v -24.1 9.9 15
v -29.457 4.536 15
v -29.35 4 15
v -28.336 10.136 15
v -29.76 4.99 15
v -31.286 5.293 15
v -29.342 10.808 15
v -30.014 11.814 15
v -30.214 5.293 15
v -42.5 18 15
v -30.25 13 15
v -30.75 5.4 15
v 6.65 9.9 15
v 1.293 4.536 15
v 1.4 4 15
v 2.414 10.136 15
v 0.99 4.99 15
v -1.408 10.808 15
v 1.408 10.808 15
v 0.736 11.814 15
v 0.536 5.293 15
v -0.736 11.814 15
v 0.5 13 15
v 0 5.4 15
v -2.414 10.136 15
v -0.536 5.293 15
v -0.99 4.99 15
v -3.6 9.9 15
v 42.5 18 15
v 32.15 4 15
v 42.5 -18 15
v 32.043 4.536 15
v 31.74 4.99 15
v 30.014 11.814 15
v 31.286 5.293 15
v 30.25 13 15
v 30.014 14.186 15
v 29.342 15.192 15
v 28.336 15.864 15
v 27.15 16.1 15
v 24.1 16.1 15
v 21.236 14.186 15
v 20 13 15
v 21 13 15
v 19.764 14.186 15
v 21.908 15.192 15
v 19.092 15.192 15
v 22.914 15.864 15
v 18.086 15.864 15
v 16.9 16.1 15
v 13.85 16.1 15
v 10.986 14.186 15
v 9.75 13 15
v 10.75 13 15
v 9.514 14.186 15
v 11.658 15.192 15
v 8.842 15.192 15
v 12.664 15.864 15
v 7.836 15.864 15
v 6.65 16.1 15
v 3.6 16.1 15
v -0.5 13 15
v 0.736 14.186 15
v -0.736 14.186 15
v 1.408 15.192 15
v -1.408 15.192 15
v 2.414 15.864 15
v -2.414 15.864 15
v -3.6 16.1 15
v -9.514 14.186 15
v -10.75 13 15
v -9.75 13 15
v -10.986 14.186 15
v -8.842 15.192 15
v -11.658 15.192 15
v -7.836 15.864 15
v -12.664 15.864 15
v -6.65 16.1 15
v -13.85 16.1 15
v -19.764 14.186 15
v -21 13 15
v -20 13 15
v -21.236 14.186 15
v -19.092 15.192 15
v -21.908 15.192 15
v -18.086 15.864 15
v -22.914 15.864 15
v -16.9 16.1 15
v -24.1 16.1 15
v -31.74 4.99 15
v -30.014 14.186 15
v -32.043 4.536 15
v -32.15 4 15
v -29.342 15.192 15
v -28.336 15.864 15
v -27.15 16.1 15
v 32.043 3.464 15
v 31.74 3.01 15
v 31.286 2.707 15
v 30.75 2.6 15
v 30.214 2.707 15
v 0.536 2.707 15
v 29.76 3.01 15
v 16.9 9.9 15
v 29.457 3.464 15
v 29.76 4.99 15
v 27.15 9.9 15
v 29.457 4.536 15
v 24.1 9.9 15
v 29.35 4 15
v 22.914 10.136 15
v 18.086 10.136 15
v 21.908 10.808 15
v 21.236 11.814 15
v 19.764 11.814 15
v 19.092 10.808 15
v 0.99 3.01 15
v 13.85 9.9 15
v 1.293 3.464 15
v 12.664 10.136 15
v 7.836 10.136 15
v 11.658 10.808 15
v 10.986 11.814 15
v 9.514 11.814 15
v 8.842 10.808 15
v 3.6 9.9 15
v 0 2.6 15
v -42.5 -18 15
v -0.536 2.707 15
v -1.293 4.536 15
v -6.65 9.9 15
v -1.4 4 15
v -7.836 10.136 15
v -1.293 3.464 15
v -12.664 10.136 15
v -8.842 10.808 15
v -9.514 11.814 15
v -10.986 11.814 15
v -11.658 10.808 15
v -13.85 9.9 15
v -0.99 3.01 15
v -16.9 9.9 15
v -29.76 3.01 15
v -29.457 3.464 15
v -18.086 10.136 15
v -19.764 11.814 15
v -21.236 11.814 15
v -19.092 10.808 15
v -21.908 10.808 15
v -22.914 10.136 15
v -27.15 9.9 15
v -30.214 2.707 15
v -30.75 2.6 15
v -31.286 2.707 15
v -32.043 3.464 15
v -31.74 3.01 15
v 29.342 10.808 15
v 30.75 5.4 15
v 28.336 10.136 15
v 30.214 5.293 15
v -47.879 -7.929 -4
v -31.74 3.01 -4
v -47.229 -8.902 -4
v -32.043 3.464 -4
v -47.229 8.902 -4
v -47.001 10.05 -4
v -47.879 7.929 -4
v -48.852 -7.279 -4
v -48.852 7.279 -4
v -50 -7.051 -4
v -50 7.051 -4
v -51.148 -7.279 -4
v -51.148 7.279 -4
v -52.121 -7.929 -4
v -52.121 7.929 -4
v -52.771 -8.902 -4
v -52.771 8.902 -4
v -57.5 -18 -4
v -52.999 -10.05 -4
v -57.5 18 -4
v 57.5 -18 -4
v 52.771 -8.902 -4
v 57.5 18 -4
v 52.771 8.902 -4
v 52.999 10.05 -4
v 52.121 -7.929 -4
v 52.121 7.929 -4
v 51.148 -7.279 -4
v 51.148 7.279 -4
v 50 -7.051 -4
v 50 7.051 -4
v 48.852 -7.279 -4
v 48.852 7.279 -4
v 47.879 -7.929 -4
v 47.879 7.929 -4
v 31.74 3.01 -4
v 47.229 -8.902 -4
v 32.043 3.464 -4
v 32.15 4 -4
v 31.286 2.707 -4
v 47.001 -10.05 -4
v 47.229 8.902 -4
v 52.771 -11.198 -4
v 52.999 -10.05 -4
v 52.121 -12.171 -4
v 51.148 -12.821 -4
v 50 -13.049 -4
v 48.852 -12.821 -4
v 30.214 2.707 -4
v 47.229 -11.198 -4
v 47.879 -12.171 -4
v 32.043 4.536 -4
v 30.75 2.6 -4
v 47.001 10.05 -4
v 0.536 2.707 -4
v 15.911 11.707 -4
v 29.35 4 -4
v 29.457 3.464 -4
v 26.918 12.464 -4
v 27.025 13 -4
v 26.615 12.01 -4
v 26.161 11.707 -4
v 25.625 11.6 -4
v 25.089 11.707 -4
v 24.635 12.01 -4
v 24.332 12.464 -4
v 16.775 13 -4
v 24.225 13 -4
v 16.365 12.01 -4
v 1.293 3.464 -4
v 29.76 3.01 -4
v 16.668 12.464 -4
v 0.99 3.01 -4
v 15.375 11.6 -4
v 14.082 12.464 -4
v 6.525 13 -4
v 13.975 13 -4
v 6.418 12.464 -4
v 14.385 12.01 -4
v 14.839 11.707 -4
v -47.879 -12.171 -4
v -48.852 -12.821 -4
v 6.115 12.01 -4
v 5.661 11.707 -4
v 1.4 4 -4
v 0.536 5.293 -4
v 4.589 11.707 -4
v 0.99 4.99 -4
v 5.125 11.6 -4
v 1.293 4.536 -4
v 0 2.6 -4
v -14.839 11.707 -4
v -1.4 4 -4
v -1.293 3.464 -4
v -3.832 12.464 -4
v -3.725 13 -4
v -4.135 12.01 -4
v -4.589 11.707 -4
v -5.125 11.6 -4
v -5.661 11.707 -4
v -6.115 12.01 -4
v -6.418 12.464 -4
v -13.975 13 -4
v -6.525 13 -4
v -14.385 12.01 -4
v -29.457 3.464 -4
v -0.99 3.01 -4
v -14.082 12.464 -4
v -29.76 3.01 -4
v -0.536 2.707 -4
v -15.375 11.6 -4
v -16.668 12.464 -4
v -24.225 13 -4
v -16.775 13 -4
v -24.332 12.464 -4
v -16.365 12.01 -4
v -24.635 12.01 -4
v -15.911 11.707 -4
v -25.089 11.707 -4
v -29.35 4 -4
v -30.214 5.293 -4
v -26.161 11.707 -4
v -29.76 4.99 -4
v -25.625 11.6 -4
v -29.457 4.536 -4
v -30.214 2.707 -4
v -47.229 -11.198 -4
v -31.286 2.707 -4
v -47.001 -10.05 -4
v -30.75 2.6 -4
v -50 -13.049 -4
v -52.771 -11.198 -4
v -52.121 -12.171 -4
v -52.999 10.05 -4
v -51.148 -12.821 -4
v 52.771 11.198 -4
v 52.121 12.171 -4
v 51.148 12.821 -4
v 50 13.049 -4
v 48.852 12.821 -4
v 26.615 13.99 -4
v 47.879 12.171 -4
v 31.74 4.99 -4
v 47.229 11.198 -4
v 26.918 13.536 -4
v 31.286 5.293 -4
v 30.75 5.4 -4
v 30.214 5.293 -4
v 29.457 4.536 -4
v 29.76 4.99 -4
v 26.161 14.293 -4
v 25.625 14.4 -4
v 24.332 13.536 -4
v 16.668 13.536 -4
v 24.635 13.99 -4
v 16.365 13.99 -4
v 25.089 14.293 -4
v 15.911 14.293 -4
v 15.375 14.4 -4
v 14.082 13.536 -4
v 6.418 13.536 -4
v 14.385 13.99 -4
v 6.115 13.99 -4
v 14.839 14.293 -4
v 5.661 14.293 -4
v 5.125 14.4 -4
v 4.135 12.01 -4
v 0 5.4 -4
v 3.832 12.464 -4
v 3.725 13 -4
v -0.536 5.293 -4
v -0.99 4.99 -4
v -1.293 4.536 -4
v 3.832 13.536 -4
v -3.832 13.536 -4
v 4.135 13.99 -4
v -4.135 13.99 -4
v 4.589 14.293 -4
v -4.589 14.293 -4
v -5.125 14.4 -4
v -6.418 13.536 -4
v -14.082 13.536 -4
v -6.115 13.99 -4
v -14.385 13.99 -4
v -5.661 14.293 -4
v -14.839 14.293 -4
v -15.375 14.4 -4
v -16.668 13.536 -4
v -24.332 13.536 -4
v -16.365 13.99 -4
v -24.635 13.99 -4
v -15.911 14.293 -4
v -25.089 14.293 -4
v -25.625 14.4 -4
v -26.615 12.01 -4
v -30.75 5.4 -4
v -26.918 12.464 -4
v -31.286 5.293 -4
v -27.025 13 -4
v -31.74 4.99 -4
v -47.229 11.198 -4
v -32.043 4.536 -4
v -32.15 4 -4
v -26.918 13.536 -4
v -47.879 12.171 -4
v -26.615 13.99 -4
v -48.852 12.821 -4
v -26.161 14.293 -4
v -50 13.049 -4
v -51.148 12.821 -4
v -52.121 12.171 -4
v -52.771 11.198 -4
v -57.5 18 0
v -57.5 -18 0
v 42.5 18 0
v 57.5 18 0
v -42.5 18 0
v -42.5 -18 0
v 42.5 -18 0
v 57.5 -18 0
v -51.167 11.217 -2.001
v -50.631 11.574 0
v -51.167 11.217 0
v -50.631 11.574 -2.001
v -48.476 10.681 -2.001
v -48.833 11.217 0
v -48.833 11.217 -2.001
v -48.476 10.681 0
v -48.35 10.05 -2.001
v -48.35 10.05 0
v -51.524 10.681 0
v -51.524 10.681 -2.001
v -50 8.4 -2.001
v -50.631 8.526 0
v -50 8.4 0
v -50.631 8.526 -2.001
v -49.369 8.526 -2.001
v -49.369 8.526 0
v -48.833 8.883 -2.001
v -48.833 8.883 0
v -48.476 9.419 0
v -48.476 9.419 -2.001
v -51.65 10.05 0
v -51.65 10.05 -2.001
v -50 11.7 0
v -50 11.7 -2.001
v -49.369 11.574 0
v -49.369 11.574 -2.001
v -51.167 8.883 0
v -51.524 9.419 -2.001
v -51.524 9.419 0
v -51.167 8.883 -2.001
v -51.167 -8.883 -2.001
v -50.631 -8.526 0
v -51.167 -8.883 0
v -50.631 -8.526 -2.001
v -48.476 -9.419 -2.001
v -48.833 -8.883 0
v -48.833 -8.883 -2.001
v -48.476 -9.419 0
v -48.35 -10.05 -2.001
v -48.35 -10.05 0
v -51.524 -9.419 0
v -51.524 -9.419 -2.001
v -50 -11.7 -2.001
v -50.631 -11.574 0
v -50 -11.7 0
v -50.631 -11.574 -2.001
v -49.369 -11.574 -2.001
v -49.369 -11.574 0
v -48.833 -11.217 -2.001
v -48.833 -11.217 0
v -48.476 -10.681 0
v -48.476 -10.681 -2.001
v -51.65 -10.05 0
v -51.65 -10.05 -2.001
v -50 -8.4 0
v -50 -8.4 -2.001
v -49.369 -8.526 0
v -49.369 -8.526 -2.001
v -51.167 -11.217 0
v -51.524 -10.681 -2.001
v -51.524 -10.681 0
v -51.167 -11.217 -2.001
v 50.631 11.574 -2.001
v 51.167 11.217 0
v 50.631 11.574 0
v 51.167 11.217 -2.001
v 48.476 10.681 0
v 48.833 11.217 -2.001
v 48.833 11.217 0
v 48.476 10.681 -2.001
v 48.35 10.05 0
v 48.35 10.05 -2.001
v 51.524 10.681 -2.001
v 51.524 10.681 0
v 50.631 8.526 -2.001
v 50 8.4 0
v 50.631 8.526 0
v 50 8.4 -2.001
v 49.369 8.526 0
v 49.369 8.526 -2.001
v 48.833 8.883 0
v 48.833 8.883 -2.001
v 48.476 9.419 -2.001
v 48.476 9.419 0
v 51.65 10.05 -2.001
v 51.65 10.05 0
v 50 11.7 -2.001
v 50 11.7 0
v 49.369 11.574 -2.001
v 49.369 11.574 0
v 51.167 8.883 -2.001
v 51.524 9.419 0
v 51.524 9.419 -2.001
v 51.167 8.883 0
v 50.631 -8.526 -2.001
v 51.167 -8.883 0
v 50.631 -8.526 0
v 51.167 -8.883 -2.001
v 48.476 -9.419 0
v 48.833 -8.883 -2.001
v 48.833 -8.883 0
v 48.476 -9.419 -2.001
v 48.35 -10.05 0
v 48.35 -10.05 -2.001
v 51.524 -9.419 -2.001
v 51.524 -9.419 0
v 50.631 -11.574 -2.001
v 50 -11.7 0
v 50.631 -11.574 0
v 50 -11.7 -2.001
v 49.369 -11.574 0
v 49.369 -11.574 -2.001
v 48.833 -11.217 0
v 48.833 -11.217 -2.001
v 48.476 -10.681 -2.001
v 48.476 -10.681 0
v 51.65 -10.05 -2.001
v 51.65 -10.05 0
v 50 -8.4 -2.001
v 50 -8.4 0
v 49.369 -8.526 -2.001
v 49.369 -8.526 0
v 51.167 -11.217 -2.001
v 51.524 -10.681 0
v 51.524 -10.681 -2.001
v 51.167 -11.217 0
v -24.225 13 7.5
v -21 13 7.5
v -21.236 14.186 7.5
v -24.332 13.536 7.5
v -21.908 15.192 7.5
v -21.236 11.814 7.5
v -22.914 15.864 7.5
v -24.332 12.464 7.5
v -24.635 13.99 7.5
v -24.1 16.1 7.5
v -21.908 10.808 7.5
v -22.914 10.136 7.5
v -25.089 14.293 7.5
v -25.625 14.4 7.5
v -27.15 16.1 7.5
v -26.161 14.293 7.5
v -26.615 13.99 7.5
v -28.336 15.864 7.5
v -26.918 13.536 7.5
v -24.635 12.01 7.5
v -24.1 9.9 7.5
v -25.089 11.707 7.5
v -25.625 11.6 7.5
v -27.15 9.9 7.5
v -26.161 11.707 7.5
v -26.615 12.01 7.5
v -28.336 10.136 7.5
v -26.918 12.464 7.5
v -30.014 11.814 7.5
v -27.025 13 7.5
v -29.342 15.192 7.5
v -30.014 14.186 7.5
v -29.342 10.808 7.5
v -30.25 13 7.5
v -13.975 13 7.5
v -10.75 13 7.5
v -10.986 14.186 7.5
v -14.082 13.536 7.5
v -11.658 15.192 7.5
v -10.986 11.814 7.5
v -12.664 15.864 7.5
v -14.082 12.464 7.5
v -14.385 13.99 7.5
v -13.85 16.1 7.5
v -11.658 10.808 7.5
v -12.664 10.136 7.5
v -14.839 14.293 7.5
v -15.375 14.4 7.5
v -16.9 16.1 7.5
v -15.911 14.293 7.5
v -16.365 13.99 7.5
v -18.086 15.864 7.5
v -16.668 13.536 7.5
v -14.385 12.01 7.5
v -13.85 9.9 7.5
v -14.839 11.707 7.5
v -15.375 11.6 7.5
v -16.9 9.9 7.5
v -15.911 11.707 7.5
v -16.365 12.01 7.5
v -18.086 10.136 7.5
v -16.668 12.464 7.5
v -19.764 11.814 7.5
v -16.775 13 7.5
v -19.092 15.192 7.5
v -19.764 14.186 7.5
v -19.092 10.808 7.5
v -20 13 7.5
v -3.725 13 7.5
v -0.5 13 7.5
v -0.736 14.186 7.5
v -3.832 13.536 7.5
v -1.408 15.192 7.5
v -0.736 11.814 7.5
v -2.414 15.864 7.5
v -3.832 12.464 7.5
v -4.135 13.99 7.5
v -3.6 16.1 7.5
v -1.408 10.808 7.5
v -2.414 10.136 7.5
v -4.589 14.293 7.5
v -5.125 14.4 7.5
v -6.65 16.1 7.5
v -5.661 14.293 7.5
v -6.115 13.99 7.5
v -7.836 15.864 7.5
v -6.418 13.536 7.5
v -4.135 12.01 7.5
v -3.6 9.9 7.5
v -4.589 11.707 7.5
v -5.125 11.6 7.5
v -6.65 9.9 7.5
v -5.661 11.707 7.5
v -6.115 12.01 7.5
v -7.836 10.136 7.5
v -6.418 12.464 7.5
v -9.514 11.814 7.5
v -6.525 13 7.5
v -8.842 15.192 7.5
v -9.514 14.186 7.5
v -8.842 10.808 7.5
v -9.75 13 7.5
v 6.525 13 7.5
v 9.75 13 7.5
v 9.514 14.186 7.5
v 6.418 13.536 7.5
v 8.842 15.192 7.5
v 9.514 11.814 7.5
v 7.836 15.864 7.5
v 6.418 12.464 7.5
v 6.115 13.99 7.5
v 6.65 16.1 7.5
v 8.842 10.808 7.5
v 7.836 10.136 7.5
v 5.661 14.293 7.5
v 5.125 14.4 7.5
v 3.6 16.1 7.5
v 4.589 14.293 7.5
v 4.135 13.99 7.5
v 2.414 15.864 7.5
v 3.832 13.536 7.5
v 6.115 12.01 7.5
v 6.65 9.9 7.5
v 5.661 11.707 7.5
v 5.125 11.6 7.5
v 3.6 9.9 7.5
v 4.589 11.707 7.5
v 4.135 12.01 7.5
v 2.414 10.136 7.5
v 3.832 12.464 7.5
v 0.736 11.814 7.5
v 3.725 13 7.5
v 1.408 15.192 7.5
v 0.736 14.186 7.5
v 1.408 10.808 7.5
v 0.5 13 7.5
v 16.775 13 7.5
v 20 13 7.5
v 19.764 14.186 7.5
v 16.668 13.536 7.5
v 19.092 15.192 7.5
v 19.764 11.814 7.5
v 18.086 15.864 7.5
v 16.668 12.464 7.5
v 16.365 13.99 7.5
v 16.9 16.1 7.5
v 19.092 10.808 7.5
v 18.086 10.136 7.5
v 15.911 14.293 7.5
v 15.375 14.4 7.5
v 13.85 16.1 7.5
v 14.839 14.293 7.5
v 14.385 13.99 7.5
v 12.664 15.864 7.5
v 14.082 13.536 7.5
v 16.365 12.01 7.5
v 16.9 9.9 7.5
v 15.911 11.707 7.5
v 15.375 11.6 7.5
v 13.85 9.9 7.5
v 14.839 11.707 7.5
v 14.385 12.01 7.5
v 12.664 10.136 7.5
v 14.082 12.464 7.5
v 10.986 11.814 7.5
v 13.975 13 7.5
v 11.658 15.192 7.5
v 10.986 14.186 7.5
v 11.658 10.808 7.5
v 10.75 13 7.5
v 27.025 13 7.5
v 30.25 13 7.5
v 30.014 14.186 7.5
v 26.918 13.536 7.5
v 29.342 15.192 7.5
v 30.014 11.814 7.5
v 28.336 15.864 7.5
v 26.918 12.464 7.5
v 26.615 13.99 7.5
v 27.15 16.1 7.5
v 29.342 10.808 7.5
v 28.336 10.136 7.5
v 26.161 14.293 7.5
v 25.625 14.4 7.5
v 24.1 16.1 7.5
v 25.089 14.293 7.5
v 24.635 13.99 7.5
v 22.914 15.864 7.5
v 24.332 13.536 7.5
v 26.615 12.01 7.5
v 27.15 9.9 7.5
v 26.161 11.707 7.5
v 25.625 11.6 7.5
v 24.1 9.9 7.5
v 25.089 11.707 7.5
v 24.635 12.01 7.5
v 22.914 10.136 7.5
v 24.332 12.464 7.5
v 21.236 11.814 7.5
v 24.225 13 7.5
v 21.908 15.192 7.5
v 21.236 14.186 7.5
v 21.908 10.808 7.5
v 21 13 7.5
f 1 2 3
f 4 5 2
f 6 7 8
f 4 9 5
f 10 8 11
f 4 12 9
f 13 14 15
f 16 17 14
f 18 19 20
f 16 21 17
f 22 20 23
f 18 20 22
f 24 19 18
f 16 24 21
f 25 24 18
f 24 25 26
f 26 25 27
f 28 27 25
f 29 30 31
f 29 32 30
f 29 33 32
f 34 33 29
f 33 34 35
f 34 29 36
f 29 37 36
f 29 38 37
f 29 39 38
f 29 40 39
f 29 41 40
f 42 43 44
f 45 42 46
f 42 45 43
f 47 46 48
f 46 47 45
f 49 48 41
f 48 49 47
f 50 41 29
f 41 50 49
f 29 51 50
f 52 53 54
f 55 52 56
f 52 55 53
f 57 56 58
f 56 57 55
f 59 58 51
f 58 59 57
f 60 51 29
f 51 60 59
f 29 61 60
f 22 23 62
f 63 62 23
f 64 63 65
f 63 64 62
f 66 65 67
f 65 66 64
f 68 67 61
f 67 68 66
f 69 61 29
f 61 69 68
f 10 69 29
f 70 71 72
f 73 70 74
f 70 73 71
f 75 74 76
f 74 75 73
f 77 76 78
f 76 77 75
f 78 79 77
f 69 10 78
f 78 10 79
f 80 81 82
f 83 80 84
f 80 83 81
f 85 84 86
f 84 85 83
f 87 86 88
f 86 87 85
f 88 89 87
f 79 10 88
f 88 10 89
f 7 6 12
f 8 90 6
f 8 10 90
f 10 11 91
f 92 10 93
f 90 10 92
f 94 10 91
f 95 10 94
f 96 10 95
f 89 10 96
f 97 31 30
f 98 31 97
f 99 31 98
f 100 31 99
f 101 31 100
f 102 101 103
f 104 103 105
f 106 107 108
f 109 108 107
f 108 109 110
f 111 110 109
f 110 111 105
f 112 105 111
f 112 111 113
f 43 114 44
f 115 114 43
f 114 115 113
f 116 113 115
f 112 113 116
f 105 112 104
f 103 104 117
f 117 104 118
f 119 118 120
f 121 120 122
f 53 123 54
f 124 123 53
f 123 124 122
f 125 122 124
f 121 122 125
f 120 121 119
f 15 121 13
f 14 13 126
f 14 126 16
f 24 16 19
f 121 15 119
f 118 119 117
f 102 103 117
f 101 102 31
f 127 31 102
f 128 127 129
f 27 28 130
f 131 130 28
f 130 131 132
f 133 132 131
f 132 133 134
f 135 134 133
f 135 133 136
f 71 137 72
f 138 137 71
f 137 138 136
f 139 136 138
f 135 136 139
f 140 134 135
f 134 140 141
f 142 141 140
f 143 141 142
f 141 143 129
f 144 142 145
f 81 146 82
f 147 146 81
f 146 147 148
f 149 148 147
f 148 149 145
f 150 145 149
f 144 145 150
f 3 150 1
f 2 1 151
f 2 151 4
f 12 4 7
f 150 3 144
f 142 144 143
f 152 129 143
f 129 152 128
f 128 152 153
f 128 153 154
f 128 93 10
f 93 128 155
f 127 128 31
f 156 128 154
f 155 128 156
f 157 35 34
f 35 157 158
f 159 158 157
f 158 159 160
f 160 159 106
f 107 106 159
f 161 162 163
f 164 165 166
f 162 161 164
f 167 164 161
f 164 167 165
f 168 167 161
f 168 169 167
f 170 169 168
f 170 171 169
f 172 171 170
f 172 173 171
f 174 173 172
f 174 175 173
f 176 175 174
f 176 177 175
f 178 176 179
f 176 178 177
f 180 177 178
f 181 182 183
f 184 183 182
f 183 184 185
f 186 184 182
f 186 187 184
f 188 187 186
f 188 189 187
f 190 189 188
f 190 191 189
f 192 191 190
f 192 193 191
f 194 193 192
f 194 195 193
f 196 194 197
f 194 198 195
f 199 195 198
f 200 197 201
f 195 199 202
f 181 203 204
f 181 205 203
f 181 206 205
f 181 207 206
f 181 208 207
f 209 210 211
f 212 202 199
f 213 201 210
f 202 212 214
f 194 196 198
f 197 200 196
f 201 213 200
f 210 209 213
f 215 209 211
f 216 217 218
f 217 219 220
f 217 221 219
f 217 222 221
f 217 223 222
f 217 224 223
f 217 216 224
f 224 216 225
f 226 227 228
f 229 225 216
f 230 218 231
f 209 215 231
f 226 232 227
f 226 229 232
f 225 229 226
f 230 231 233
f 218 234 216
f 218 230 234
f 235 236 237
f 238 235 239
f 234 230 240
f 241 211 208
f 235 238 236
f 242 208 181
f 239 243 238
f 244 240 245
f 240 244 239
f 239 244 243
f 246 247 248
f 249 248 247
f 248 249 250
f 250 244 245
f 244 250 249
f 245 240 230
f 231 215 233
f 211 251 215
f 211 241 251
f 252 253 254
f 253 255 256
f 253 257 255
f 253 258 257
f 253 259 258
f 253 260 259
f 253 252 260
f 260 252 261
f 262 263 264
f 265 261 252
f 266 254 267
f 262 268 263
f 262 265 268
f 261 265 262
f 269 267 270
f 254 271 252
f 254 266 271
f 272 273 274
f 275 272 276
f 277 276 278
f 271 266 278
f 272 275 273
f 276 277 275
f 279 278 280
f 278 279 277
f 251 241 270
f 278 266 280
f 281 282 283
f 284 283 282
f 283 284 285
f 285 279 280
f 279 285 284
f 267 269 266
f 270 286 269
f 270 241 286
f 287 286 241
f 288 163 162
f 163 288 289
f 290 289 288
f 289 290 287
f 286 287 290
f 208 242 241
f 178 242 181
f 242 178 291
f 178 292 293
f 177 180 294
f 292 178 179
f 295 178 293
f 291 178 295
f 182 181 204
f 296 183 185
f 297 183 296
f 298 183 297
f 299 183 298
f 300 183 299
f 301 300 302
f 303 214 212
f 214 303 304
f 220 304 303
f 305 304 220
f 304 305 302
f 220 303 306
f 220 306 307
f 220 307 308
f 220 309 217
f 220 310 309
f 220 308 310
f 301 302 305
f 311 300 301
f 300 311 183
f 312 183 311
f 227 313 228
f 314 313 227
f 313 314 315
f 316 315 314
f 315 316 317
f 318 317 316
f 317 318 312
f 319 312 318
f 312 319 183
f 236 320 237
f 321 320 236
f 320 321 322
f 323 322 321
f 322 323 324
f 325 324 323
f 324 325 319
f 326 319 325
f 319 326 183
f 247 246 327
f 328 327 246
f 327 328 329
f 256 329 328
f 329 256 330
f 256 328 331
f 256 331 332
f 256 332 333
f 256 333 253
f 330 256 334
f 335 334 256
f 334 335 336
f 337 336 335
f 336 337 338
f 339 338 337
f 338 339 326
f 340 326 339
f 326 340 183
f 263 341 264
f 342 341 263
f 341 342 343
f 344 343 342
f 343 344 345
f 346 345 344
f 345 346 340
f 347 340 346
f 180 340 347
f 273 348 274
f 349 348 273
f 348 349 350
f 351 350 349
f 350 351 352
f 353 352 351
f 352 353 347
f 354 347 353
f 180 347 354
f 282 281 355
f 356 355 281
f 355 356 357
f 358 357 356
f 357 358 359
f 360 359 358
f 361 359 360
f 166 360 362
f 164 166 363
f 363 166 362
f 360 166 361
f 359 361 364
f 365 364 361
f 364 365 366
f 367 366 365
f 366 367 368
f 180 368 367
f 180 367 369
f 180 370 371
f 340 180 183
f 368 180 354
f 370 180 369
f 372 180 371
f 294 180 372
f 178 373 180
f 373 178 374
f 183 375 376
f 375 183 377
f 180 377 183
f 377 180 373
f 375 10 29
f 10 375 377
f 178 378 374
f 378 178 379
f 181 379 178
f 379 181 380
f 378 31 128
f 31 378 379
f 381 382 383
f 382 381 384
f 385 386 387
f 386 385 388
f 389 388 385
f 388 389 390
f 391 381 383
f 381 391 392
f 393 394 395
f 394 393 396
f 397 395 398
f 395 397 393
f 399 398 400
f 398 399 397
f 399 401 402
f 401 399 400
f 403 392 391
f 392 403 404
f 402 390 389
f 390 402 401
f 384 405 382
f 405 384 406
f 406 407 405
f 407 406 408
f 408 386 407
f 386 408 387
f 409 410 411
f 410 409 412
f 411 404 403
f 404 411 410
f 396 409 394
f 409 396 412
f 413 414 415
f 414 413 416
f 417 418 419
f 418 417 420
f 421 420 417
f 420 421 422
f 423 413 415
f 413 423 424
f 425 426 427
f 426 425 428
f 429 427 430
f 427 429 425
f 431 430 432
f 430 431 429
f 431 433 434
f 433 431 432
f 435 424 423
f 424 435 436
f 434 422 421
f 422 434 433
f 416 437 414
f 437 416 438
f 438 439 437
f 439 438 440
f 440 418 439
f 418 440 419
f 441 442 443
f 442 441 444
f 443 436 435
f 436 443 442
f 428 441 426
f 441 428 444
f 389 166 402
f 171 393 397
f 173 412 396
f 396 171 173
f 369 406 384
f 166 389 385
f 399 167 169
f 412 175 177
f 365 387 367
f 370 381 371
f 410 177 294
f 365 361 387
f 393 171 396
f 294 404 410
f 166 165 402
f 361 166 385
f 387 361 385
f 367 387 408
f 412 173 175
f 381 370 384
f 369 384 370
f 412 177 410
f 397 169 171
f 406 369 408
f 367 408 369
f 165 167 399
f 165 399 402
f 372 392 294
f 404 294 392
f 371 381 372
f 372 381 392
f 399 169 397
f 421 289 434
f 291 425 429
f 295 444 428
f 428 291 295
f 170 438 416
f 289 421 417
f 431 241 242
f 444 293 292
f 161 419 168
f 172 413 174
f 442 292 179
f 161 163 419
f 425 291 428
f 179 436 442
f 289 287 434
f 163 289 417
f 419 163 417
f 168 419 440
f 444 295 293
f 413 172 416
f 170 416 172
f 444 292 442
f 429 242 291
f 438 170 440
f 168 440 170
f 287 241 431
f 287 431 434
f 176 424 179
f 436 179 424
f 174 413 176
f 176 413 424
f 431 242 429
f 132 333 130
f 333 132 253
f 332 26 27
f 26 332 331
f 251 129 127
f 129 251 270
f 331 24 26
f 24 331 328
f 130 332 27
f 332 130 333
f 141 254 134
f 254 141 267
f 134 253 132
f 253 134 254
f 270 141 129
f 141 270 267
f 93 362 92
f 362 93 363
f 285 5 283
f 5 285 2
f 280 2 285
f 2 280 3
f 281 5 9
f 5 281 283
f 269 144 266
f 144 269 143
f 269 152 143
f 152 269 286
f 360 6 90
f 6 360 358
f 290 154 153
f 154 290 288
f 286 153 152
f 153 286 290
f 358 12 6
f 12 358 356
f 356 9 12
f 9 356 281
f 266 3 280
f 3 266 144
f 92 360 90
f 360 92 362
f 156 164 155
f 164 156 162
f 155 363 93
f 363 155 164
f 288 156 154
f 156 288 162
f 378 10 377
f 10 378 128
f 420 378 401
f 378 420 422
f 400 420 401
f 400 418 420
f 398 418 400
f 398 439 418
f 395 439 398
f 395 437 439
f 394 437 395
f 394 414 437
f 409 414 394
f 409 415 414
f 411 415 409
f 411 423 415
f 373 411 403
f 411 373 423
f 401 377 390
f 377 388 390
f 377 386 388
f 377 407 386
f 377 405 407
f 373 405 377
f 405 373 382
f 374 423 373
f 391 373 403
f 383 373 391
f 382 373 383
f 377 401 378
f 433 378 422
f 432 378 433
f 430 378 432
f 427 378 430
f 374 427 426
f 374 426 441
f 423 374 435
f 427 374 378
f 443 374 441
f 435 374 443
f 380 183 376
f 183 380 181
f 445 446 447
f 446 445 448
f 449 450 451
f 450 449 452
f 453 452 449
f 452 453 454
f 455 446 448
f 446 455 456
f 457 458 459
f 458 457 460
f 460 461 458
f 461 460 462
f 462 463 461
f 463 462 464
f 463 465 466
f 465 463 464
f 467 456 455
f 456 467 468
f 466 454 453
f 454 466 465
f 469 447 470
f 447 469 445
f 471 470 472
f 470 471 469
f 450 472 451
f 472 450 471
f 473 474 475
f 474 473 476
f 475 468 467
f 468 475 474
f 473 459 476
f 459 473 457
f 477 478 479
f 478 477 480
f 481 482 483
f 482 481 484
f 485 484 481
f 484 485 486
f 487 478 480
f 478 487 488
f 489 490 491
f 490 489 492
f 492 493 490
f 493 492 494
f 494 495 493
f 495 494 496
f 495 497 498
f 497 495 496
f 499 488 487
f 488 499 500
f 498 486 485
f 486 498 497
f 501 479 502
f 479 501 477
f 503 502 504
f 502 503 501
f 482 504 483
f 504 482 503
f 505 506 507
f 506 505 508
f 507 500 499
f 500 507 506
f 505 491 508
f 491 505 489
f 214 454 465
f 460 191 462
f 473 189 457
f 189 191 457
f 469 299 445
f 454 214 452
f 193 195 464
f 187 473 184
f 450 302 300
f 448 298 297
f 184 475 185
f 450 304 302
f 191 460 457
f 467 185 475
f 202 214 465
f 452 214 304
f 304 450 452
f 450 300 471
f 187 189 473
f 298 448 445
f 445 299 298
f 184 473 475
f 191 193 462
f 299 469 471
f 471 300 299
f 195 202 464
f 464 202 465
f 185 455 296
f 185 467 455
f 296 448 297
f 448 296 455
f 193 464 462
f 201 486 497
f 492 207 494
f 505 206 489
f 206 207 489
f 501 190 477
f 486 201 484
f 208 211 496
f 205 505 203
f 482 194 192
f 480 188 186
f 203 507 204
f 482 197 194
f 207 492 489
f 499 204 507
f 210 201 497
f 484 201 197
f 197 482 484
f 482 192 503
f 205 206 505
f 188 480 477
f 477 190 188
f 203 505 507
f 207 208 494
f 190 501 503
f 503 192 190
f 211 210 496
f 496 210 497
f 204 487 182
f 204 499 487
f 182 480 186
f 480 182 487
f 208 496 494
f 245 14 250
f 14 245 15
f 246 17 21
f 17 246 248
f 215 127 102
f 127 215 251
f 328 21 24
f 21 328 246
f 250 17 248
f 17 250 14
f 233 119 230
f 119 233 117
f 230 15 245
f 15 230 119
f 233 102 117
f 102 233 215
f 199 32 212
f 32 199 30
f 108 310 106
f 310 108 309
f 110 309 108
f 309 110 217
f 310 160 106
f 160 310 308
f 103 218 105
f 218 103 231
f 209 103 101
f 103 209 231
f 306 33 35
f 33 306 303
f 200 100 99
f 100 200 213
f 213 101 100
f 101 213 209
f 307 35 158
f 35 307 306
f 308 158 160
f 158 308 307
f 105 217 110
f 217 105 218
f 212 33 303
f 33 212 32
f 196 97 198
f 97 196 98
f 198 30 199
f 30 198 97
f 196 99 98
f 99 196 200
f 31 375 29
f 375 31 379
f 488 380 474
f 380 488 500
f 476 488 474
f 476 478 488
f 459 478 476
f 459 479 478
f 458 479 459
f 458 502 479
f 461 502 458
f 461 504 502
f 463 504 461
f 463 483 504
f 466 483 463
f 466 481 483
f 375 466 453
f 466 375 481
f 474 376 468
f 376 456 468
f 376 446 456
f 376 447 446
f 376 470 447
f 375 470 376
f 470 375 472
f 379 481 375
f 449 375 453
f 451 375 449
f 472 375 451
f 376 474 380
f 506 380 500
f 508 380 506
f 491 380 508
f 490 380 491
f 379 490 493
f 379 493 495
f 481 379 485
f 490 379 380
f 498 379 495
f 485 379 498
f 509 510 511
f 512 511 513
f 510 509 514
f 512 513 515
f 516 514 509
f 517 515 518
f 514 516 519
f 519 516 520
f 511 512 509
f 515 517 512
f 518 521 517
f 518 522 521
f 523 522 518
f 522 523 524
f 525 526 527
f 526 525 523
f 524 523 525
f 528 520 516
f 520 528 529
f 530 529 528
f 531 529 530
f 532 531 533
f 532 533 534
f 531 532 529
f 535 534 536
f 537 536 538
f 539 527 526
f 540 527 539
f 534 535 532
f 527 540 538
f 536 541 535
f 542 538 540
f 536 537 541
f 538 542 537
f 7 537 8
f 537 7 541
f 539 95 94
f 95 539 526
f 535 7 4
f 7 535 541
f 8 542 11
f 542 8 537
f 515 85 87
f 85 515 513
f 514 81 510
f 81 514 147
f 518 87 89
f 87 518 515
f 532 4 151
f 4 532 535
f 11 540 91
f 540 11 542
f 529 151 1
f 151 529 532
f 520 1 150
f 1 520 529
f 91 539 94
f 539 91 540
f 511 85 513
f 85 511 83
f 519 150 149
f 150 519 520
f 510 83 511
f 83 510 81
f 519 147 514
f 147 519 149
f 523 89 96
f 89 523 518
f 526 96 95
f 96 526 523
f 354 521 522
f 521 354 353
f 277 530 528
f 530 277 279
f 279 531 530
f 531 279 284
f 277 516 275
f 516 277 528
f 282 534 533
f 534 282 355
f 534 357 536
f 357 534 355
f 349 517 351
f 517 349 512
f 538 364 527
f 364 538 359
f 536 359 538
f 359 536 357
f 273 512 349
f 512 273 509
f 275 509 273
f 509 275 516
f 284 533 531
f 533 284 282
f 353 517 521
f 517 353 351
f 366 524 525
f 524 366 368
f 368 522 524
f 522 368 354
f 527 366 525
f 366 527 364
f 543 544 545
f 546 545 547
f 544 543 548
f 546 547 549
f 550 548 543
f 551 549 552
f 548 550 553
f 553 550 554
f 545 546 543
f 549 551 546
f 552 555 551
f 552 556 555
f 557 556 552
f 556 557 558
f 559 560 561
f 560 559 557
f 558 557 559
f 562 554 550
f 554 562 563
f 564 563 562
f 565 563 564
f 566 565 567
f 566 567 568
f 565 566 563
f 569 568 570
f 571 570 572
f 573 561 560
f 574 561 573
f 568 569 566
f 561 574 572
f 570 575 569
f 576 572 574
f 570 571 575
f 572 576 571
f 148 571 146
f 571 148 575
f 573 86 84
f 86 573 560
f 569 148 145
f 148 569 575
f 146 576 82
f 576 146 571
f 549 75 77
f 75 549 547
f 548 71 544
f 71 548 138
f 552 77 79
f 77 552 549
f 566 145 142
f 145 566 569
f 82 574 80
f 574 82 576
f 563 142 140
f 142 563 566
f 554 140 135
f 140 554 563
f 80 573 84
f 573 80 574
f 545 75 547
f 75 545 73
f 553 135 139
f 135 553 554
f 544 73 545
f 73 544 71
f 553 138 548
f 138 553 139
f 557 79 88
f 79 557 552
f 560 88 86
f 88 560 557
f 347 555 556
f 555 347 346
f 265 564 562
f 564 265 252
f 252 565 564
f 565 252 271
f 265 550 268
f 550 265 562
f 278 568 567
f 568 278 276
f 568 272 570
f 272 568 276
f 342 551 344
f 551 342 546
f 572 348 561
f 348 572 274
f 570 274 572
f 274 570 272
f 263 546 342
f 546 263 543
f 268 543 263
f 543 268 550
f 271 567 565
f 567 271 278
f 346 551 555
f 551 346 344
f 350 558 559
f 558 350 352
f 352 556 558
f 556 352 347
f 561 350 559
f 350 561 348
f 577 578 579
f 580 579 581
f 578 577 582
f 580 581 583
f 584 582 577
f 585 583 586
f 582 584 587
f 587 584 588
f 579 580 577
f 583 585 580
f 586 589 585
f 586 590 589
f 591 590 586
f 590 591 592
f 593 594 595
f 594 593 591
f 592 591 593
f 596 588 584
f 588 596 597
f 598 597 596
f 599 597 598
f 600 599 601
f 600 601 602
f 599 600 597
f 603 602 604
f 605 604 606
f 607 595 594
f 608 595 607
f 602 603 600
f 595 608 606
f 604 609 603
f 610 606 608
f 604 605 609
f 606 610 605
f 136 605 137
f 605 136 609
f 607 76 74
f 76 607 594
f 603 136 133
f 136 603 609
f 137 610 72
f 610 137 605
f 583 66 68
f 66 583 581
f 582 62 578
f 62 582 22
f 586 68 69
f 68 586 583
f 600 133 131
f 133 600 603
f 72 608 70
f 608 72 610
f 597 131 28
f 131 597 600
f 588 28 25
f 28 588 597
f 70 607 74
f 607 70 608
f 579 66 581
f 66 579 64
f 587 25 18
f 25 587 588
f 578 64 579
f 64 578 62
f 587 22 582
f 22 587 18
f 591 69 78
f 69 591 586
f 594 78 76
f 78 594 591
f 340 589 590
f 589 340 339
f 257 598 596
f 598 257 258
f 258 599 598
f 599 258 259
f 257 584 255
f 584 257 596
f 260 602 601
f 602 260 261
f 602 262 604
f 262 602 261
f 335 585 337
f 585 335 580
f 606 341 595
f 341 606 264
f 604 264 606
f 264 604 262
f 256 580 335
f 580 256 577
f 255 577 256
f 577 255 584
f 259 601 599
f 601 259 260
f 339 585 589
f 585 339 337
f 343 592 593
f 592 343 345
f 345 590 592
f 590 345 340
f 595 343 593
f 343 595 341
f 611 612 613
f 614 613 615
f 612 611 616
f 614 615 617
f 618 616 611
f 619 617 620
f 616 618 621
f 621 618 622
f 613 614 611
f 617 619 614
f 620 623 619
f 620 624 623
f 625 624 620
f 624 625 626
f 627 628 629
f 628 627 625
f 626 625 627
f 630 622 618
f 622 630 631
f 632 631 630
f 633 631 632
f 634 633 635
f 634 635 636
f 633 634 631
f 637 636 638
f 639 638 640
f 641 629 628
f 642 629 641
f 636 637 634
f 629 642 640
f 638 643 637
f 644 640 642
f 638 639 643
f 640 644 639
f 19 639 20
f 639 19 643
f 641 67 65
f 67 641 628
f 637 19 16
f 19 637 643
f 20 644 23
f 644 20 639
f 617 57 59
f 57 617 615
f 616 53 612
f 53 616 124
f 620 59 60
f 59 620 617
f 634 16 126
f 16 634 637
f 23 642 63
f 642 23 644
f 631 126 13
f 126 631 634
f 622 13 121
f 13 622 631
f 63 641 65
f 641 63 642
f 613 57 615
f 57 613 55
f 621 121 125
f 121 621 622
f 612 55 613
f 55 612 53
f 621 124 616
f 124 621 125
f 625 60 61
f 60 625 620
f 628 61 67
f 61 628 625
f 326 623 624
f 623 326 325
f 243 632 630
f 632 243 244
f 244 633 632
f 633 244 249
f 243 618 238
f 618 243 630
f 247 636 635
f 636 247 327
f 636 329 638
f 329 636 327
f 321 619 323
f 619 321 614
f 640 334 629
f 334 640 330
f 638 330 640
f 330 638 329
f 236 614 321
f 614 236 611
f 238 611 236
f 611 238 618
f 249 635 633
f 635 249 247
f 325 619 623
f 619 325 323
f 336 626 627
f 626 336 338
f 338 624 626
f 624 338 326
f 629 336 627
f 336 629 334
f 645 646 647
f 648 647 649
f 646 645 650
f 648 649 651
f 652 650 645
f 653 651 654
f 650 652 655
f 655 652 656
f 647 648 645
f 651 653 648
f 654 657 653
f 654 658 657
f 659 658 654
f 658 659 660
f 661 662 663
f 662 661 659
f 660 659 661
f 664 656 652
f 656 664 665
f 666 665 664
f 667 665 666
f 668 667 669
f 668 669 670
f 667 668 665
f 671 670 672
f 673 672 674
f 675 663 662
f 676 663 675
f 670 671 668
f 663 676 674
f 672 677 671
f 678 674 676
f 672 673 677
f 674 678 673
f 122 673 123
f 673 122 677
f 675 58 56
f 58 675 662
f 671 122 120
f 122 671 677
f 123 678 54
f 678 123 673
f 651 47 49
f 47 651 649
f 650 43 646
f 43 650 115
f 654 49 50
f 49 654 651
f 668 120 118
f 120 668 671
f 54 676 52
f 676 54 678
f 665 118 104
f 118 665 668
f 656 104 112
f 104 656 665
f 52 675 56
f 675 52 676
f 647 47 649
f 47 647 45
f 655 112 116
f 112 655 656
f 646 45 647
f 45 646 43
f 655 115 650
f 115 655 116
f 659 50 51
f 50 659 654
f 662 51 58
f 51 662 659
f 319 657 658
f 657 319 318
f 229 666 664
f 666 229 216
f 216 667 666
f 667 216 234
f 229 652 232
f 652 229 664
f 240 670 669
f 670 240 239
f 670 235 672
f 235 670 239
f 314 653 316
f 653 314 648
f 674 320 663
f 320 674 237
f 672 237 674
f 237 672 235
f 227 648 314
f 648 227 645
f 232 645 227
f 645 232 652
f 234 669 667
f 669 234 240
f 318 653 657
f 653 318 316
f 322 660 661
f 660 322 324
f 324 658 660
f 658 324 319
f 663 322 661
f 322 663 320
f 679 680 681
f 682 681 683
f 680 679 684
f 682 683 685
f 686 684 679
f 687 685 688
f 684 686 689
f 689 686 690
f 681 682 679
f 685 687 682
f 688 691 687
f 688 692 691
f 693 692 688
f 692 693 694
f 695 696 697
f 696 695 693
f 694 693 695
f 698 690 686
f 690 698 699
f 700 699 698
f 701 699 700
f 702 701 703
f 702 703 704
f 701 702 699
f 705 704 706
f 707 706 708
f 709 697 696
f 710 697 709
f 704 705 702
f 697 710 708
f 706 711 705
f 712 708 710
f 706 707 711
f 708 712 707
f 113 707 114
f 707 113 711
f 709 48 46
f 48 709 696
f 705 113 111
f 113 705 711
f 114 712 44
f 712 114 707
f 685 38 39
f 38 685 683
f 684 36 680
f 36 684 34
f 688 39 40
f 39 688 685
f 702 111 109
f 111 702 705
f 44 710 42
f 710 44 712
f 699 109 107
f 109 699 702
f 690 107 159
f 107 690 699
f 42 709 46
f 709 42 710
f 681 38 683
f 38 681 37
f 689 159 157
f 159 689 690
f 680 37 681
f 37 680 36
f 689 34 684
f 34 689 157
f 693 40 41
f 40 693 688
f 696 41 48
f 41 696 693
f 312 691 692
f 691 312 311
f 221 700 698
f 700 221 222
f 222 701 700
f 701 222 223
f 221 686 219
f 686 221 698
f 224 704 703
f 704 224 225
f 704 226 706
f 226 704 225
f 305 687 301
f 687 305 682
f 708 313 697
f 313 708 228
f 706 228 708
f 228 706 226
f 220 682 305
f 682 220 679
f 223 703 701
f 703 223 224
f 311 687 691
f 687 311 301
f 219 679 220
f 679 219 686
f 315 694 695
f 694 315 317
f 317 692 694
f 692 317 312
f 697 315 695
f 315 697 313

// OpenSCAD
// file: parameter.scad
nStrings=6;
nFrets=24;
nLedFrets=16;
m5Dia=5.3;
m5HeadZ=3.5;
m4Dia=4.3;
m4NutDia=8.3;
m4NutZ=3.5;
m4HeadZ=2.5;
m3Dia=3.3;
m3NutDia=6.6;
m3NutZ=2.5;
m3HeadZ=2;
strDistN=7;
strDistB=10.25;
scale=645;
neckSlotY=500;

slotXY=15;

bodySlotX=115;
bodySlotY=250;

jackYA=40;
jackYB=54;
jackZA=20;
jackZB=25;

bodyX=300;

bodyZ=40;

strDia=[1.7,1.4,1.1,0.7,0.5,0.35];

fretStrPlus=4;
fretLN=strDistN*(nStrings-1)+fretStrPlus*2;
fretLB=strDistB*(nStrings-1)+fretStrPlus*2;
strSpanB=strDistB*(nStrings-1);
strSpanN=strDistN*(nStrings-1);
fretBtmZ=1;
neckSlotX=fretLN;
neckSlotDist=neckSlotX-slotXY*2;

neck_sideT=5.5; //thicknes of the neck side locks
neck_bottomT=2.5;

neck_mntPosYA=447;
neck_mntPosYB=420;
neck_mntEndT=2.5;
neck_lastFretSpc=13;

nut_slotSink=6;

//fretY=16;
fretPcbZ=1.6;
fretDia=3.5;
fretZ=1.5;
fretOvrZ=4;
fretboardZ=fretOvrZ+fretPcbZ;



L=scale;
k=1.05946;

fretPos1=scale-(scale/pow(k,4));

function fretPos(i)=L-(L/pow(k,i));
function fretSpc(i)=(L/pow(k,i))-(L/pow(k,i+1));
function strSpc(i)=i/L*strDistB+(1-i/L)*strDistN;
function fretL(i)=(i/L*strDistB+(1-i/L)*strDistN)*(nStrings-1)+fretStrPlus*2;

echo (70-(fretL(fretPos(1))));
// main file
include <parameter.scad>;

bridge(2);

//bockCut();
//scrw(3);
//bock();

//translate([0,0,0])difference(){
//bridgeMount();
//}

topZ=4;
bottomZ=4;
z=topZ+bottomZ+slotXY;
sink=1.5;
bockSlotDia=6;//(x-slotXY)/2;
bockSlotSpc=1.2;
yA=36;
x=bodySlotX-slotXY*2;
strStrt=5;
scrwD=3.3;
scrwTD=2.8;
scrwHeadD=6;
scrwHeadZ=2;
StrMountT=16;
scrwOff=4;
mntY=yA;

module bridge(part){
translate([0,0,0])bridgeMount(part);

if(part==1||part==0)translate([0,yA/2,slotXY])strStuff(part);
}
 

module scrw(dia){
$fn=16;
headD=scrwHeadD;
headZ=scrwHeadZ;
cylinder(d=dia,h=z);
translate([0,0,z-headZ])cylinder(d1=dia,d2=headD,h=headZ);
}

module bockCut(){
$fn=16;
t=0.2;
rotate([0,0,0])
for(i=[0:nStrings-1]){
translate([strStrt,i*strDistB-strSpanB/2,0]){
hull(){
translate([0,strDistB/2-bockSlotDia/2-bockSlotSpc/2,0])rotate([0,0,0])cylinder(d=bockSlotDia+t,h=z);
translate([0,-(strDistB/2-bockSlotDia/2-bockSlotSpc/2),0])rotate([0,0,0])cylinder(d=bockSlotDia+t,h=z);   
}
translate([0,0,-z])cylinder(d=scrwTD,h=z);
}}
}

module strStuff(part){
zStrM=7;


strHDia=2.5;
strings=nStrings;
spacing=strDistB;


translate([-x/2,0,0])rotate([0,0,-90]){
for(i=[0:strings-1]){
translate([strStrt,i*spacing+(x-strSpanB)/2,-slotXY/2+scrwHeadZ]){
if(part==0)bock();
}}
}

translate([-x/2,0,0])rotate([0,0,-90]){
difference(){
difference(){
hull(){
$fn=32;
translate([0,slotXY/2,zStrM/2])rotate([0,90,0])cylinder(d=zStrM,h=yA);
translate([0,x-slotXY/2,zStrM/2])rotate([0,90,0])cylinder(d=zStrM,h=yA);
}
hull(){
translate([0,0,0]){
translate([-1,-x/2,topZ])cube([1,x*2,zStrM]);
translate([yA-3-StrMountT,-x/2,4])cube([3,x*2,yA]);
}
}
//translate([-1,-y/2,topZ])cube([bockSlotDia*2+2,y*2,z]);
}

for(i=[0:strings-1]){
translate([0,i*spacing+(x-strSpanB)/2,0]){
translate([yA-StrMountT+2,0,topZ])rotate([0,99,0])translate([0,0,-slotXY])cylinder(d=strHDia,h=yA,$fn=16);

}}

translate([-scrwOff,0,0]){
translate([yA/2,x/2,-z+topZ+0.001])scrw(scrwD);
translate([yA/2,x/2+strSpanB/2+strDistB/2,-z+topZ+0.001])scrw(scrwD); 
translate([yA/2,x/2-(strSpanB/2+strDistB/2),-z+topZ+0.001])scrw(scrwD);
}

translate([0,x/2,-5])bockCut();

}
}
}

module bridgeMount(part){
z=topZ+bottomZ+slotXY;

difference(){
union(){
oneSide(1);
oneSide(-1);
}
translate([0,yA/2,slotXY/2])rotate([0,0,-90])bockCut();
}

phSp=0.4;

module oneSide(mirror){
scale([mirror,1,1])translate([0,0,0])difference(){
union(){
if(part==2||part==0)translate([-bodySlotX/4,0,z/2-bottomZ-topZ/2])cube([bodySlotX/2,yA,z-topZ],center=true);
hull(){
translate([-bodySlotX/2+slotXY,0,z/2-bottomZ])cube([slotXY,yA,z],center=true);
translate([-bodySlotX/2+slotXY/2+1,0,z/2-bottomZ])cube([slotXY+2,mntY,z],center=true);
}
}

translate([-bodySlotX/2+slotXY/2,0,(slotXY)/2])cube([slotXY,slotXY*4,slotXY],center=true);
//translate([-bodySlotX/2+slotXY/2,0,(slotXY)/2])cube([slotXY*6,slotXY,slotXY],center=true);


translate([-bodySlotX/2+slotXY/2,slotXY-scrwD*1.5,-bottomZ+0.001])scrw(scrwD);
translate([-bodySlotX/2+slotXY/2,-slotXY+scrwD*1.5,-bottomZ+0.001])scrw(scrwD);

translate([-bodySlotX/2+slotXY/2,slotXY-scrwD*1.5,-bottomZ+z-0.001])rotate([180,0,0])scrw(scrwD);
translate([-bodySlotX/2+slotXY/2,-slotXY+scrwD*1.5,-bottomZ+z-0.001])rotate([180,0,0])scrw(scrwD);

translate([0,scrwOff,0]){
translate([0,0,-bottomZ-0.001])scrw(scrwTD);
translate([-(strSpanB/2+strDistB/2),0,-bottomZ-0.001])scrw(scrwTD);
}

if(part==1)translate([0,0,(z-topZ)/2-bottomZ])cube([300,300,z-topZ],center=true);
if(part==2)translate([0,0,z/2+slotXY])cube([300,300,z],center=true);
}
}
}

module bock(){
$fn=16;
bockDia=bockSlotDia-0.4;
z=z/2+bockDia/2-scrwHeadZ;
hull(){
translate([0,strDistB/2-bockSlotDia/2-bockSlotSpc/2,0])rotate([0,0,0])cylinder(d=bockDia,h=z-bockSlotDia/2);
translate([0,-(strDistB/2-bockSlotDia/2-bockSlotSpc/2),0])rotate([0,0,0])cylinder(d=bockDia,h=z-bockSlotDia/2);
}
translate([0,strDistB/2-bockSlotDia/2-bockSlotSpc/2,z-bockSlotDia/2])rotate([0,0,0])sphere(d=bockDia);
translate([0,-(strDistB/2-bockSlotDia/2-bockSlotSpc/2),z-bockSlotDia/2])rotate([0,0,0])sphere(d=bockDia);
}
